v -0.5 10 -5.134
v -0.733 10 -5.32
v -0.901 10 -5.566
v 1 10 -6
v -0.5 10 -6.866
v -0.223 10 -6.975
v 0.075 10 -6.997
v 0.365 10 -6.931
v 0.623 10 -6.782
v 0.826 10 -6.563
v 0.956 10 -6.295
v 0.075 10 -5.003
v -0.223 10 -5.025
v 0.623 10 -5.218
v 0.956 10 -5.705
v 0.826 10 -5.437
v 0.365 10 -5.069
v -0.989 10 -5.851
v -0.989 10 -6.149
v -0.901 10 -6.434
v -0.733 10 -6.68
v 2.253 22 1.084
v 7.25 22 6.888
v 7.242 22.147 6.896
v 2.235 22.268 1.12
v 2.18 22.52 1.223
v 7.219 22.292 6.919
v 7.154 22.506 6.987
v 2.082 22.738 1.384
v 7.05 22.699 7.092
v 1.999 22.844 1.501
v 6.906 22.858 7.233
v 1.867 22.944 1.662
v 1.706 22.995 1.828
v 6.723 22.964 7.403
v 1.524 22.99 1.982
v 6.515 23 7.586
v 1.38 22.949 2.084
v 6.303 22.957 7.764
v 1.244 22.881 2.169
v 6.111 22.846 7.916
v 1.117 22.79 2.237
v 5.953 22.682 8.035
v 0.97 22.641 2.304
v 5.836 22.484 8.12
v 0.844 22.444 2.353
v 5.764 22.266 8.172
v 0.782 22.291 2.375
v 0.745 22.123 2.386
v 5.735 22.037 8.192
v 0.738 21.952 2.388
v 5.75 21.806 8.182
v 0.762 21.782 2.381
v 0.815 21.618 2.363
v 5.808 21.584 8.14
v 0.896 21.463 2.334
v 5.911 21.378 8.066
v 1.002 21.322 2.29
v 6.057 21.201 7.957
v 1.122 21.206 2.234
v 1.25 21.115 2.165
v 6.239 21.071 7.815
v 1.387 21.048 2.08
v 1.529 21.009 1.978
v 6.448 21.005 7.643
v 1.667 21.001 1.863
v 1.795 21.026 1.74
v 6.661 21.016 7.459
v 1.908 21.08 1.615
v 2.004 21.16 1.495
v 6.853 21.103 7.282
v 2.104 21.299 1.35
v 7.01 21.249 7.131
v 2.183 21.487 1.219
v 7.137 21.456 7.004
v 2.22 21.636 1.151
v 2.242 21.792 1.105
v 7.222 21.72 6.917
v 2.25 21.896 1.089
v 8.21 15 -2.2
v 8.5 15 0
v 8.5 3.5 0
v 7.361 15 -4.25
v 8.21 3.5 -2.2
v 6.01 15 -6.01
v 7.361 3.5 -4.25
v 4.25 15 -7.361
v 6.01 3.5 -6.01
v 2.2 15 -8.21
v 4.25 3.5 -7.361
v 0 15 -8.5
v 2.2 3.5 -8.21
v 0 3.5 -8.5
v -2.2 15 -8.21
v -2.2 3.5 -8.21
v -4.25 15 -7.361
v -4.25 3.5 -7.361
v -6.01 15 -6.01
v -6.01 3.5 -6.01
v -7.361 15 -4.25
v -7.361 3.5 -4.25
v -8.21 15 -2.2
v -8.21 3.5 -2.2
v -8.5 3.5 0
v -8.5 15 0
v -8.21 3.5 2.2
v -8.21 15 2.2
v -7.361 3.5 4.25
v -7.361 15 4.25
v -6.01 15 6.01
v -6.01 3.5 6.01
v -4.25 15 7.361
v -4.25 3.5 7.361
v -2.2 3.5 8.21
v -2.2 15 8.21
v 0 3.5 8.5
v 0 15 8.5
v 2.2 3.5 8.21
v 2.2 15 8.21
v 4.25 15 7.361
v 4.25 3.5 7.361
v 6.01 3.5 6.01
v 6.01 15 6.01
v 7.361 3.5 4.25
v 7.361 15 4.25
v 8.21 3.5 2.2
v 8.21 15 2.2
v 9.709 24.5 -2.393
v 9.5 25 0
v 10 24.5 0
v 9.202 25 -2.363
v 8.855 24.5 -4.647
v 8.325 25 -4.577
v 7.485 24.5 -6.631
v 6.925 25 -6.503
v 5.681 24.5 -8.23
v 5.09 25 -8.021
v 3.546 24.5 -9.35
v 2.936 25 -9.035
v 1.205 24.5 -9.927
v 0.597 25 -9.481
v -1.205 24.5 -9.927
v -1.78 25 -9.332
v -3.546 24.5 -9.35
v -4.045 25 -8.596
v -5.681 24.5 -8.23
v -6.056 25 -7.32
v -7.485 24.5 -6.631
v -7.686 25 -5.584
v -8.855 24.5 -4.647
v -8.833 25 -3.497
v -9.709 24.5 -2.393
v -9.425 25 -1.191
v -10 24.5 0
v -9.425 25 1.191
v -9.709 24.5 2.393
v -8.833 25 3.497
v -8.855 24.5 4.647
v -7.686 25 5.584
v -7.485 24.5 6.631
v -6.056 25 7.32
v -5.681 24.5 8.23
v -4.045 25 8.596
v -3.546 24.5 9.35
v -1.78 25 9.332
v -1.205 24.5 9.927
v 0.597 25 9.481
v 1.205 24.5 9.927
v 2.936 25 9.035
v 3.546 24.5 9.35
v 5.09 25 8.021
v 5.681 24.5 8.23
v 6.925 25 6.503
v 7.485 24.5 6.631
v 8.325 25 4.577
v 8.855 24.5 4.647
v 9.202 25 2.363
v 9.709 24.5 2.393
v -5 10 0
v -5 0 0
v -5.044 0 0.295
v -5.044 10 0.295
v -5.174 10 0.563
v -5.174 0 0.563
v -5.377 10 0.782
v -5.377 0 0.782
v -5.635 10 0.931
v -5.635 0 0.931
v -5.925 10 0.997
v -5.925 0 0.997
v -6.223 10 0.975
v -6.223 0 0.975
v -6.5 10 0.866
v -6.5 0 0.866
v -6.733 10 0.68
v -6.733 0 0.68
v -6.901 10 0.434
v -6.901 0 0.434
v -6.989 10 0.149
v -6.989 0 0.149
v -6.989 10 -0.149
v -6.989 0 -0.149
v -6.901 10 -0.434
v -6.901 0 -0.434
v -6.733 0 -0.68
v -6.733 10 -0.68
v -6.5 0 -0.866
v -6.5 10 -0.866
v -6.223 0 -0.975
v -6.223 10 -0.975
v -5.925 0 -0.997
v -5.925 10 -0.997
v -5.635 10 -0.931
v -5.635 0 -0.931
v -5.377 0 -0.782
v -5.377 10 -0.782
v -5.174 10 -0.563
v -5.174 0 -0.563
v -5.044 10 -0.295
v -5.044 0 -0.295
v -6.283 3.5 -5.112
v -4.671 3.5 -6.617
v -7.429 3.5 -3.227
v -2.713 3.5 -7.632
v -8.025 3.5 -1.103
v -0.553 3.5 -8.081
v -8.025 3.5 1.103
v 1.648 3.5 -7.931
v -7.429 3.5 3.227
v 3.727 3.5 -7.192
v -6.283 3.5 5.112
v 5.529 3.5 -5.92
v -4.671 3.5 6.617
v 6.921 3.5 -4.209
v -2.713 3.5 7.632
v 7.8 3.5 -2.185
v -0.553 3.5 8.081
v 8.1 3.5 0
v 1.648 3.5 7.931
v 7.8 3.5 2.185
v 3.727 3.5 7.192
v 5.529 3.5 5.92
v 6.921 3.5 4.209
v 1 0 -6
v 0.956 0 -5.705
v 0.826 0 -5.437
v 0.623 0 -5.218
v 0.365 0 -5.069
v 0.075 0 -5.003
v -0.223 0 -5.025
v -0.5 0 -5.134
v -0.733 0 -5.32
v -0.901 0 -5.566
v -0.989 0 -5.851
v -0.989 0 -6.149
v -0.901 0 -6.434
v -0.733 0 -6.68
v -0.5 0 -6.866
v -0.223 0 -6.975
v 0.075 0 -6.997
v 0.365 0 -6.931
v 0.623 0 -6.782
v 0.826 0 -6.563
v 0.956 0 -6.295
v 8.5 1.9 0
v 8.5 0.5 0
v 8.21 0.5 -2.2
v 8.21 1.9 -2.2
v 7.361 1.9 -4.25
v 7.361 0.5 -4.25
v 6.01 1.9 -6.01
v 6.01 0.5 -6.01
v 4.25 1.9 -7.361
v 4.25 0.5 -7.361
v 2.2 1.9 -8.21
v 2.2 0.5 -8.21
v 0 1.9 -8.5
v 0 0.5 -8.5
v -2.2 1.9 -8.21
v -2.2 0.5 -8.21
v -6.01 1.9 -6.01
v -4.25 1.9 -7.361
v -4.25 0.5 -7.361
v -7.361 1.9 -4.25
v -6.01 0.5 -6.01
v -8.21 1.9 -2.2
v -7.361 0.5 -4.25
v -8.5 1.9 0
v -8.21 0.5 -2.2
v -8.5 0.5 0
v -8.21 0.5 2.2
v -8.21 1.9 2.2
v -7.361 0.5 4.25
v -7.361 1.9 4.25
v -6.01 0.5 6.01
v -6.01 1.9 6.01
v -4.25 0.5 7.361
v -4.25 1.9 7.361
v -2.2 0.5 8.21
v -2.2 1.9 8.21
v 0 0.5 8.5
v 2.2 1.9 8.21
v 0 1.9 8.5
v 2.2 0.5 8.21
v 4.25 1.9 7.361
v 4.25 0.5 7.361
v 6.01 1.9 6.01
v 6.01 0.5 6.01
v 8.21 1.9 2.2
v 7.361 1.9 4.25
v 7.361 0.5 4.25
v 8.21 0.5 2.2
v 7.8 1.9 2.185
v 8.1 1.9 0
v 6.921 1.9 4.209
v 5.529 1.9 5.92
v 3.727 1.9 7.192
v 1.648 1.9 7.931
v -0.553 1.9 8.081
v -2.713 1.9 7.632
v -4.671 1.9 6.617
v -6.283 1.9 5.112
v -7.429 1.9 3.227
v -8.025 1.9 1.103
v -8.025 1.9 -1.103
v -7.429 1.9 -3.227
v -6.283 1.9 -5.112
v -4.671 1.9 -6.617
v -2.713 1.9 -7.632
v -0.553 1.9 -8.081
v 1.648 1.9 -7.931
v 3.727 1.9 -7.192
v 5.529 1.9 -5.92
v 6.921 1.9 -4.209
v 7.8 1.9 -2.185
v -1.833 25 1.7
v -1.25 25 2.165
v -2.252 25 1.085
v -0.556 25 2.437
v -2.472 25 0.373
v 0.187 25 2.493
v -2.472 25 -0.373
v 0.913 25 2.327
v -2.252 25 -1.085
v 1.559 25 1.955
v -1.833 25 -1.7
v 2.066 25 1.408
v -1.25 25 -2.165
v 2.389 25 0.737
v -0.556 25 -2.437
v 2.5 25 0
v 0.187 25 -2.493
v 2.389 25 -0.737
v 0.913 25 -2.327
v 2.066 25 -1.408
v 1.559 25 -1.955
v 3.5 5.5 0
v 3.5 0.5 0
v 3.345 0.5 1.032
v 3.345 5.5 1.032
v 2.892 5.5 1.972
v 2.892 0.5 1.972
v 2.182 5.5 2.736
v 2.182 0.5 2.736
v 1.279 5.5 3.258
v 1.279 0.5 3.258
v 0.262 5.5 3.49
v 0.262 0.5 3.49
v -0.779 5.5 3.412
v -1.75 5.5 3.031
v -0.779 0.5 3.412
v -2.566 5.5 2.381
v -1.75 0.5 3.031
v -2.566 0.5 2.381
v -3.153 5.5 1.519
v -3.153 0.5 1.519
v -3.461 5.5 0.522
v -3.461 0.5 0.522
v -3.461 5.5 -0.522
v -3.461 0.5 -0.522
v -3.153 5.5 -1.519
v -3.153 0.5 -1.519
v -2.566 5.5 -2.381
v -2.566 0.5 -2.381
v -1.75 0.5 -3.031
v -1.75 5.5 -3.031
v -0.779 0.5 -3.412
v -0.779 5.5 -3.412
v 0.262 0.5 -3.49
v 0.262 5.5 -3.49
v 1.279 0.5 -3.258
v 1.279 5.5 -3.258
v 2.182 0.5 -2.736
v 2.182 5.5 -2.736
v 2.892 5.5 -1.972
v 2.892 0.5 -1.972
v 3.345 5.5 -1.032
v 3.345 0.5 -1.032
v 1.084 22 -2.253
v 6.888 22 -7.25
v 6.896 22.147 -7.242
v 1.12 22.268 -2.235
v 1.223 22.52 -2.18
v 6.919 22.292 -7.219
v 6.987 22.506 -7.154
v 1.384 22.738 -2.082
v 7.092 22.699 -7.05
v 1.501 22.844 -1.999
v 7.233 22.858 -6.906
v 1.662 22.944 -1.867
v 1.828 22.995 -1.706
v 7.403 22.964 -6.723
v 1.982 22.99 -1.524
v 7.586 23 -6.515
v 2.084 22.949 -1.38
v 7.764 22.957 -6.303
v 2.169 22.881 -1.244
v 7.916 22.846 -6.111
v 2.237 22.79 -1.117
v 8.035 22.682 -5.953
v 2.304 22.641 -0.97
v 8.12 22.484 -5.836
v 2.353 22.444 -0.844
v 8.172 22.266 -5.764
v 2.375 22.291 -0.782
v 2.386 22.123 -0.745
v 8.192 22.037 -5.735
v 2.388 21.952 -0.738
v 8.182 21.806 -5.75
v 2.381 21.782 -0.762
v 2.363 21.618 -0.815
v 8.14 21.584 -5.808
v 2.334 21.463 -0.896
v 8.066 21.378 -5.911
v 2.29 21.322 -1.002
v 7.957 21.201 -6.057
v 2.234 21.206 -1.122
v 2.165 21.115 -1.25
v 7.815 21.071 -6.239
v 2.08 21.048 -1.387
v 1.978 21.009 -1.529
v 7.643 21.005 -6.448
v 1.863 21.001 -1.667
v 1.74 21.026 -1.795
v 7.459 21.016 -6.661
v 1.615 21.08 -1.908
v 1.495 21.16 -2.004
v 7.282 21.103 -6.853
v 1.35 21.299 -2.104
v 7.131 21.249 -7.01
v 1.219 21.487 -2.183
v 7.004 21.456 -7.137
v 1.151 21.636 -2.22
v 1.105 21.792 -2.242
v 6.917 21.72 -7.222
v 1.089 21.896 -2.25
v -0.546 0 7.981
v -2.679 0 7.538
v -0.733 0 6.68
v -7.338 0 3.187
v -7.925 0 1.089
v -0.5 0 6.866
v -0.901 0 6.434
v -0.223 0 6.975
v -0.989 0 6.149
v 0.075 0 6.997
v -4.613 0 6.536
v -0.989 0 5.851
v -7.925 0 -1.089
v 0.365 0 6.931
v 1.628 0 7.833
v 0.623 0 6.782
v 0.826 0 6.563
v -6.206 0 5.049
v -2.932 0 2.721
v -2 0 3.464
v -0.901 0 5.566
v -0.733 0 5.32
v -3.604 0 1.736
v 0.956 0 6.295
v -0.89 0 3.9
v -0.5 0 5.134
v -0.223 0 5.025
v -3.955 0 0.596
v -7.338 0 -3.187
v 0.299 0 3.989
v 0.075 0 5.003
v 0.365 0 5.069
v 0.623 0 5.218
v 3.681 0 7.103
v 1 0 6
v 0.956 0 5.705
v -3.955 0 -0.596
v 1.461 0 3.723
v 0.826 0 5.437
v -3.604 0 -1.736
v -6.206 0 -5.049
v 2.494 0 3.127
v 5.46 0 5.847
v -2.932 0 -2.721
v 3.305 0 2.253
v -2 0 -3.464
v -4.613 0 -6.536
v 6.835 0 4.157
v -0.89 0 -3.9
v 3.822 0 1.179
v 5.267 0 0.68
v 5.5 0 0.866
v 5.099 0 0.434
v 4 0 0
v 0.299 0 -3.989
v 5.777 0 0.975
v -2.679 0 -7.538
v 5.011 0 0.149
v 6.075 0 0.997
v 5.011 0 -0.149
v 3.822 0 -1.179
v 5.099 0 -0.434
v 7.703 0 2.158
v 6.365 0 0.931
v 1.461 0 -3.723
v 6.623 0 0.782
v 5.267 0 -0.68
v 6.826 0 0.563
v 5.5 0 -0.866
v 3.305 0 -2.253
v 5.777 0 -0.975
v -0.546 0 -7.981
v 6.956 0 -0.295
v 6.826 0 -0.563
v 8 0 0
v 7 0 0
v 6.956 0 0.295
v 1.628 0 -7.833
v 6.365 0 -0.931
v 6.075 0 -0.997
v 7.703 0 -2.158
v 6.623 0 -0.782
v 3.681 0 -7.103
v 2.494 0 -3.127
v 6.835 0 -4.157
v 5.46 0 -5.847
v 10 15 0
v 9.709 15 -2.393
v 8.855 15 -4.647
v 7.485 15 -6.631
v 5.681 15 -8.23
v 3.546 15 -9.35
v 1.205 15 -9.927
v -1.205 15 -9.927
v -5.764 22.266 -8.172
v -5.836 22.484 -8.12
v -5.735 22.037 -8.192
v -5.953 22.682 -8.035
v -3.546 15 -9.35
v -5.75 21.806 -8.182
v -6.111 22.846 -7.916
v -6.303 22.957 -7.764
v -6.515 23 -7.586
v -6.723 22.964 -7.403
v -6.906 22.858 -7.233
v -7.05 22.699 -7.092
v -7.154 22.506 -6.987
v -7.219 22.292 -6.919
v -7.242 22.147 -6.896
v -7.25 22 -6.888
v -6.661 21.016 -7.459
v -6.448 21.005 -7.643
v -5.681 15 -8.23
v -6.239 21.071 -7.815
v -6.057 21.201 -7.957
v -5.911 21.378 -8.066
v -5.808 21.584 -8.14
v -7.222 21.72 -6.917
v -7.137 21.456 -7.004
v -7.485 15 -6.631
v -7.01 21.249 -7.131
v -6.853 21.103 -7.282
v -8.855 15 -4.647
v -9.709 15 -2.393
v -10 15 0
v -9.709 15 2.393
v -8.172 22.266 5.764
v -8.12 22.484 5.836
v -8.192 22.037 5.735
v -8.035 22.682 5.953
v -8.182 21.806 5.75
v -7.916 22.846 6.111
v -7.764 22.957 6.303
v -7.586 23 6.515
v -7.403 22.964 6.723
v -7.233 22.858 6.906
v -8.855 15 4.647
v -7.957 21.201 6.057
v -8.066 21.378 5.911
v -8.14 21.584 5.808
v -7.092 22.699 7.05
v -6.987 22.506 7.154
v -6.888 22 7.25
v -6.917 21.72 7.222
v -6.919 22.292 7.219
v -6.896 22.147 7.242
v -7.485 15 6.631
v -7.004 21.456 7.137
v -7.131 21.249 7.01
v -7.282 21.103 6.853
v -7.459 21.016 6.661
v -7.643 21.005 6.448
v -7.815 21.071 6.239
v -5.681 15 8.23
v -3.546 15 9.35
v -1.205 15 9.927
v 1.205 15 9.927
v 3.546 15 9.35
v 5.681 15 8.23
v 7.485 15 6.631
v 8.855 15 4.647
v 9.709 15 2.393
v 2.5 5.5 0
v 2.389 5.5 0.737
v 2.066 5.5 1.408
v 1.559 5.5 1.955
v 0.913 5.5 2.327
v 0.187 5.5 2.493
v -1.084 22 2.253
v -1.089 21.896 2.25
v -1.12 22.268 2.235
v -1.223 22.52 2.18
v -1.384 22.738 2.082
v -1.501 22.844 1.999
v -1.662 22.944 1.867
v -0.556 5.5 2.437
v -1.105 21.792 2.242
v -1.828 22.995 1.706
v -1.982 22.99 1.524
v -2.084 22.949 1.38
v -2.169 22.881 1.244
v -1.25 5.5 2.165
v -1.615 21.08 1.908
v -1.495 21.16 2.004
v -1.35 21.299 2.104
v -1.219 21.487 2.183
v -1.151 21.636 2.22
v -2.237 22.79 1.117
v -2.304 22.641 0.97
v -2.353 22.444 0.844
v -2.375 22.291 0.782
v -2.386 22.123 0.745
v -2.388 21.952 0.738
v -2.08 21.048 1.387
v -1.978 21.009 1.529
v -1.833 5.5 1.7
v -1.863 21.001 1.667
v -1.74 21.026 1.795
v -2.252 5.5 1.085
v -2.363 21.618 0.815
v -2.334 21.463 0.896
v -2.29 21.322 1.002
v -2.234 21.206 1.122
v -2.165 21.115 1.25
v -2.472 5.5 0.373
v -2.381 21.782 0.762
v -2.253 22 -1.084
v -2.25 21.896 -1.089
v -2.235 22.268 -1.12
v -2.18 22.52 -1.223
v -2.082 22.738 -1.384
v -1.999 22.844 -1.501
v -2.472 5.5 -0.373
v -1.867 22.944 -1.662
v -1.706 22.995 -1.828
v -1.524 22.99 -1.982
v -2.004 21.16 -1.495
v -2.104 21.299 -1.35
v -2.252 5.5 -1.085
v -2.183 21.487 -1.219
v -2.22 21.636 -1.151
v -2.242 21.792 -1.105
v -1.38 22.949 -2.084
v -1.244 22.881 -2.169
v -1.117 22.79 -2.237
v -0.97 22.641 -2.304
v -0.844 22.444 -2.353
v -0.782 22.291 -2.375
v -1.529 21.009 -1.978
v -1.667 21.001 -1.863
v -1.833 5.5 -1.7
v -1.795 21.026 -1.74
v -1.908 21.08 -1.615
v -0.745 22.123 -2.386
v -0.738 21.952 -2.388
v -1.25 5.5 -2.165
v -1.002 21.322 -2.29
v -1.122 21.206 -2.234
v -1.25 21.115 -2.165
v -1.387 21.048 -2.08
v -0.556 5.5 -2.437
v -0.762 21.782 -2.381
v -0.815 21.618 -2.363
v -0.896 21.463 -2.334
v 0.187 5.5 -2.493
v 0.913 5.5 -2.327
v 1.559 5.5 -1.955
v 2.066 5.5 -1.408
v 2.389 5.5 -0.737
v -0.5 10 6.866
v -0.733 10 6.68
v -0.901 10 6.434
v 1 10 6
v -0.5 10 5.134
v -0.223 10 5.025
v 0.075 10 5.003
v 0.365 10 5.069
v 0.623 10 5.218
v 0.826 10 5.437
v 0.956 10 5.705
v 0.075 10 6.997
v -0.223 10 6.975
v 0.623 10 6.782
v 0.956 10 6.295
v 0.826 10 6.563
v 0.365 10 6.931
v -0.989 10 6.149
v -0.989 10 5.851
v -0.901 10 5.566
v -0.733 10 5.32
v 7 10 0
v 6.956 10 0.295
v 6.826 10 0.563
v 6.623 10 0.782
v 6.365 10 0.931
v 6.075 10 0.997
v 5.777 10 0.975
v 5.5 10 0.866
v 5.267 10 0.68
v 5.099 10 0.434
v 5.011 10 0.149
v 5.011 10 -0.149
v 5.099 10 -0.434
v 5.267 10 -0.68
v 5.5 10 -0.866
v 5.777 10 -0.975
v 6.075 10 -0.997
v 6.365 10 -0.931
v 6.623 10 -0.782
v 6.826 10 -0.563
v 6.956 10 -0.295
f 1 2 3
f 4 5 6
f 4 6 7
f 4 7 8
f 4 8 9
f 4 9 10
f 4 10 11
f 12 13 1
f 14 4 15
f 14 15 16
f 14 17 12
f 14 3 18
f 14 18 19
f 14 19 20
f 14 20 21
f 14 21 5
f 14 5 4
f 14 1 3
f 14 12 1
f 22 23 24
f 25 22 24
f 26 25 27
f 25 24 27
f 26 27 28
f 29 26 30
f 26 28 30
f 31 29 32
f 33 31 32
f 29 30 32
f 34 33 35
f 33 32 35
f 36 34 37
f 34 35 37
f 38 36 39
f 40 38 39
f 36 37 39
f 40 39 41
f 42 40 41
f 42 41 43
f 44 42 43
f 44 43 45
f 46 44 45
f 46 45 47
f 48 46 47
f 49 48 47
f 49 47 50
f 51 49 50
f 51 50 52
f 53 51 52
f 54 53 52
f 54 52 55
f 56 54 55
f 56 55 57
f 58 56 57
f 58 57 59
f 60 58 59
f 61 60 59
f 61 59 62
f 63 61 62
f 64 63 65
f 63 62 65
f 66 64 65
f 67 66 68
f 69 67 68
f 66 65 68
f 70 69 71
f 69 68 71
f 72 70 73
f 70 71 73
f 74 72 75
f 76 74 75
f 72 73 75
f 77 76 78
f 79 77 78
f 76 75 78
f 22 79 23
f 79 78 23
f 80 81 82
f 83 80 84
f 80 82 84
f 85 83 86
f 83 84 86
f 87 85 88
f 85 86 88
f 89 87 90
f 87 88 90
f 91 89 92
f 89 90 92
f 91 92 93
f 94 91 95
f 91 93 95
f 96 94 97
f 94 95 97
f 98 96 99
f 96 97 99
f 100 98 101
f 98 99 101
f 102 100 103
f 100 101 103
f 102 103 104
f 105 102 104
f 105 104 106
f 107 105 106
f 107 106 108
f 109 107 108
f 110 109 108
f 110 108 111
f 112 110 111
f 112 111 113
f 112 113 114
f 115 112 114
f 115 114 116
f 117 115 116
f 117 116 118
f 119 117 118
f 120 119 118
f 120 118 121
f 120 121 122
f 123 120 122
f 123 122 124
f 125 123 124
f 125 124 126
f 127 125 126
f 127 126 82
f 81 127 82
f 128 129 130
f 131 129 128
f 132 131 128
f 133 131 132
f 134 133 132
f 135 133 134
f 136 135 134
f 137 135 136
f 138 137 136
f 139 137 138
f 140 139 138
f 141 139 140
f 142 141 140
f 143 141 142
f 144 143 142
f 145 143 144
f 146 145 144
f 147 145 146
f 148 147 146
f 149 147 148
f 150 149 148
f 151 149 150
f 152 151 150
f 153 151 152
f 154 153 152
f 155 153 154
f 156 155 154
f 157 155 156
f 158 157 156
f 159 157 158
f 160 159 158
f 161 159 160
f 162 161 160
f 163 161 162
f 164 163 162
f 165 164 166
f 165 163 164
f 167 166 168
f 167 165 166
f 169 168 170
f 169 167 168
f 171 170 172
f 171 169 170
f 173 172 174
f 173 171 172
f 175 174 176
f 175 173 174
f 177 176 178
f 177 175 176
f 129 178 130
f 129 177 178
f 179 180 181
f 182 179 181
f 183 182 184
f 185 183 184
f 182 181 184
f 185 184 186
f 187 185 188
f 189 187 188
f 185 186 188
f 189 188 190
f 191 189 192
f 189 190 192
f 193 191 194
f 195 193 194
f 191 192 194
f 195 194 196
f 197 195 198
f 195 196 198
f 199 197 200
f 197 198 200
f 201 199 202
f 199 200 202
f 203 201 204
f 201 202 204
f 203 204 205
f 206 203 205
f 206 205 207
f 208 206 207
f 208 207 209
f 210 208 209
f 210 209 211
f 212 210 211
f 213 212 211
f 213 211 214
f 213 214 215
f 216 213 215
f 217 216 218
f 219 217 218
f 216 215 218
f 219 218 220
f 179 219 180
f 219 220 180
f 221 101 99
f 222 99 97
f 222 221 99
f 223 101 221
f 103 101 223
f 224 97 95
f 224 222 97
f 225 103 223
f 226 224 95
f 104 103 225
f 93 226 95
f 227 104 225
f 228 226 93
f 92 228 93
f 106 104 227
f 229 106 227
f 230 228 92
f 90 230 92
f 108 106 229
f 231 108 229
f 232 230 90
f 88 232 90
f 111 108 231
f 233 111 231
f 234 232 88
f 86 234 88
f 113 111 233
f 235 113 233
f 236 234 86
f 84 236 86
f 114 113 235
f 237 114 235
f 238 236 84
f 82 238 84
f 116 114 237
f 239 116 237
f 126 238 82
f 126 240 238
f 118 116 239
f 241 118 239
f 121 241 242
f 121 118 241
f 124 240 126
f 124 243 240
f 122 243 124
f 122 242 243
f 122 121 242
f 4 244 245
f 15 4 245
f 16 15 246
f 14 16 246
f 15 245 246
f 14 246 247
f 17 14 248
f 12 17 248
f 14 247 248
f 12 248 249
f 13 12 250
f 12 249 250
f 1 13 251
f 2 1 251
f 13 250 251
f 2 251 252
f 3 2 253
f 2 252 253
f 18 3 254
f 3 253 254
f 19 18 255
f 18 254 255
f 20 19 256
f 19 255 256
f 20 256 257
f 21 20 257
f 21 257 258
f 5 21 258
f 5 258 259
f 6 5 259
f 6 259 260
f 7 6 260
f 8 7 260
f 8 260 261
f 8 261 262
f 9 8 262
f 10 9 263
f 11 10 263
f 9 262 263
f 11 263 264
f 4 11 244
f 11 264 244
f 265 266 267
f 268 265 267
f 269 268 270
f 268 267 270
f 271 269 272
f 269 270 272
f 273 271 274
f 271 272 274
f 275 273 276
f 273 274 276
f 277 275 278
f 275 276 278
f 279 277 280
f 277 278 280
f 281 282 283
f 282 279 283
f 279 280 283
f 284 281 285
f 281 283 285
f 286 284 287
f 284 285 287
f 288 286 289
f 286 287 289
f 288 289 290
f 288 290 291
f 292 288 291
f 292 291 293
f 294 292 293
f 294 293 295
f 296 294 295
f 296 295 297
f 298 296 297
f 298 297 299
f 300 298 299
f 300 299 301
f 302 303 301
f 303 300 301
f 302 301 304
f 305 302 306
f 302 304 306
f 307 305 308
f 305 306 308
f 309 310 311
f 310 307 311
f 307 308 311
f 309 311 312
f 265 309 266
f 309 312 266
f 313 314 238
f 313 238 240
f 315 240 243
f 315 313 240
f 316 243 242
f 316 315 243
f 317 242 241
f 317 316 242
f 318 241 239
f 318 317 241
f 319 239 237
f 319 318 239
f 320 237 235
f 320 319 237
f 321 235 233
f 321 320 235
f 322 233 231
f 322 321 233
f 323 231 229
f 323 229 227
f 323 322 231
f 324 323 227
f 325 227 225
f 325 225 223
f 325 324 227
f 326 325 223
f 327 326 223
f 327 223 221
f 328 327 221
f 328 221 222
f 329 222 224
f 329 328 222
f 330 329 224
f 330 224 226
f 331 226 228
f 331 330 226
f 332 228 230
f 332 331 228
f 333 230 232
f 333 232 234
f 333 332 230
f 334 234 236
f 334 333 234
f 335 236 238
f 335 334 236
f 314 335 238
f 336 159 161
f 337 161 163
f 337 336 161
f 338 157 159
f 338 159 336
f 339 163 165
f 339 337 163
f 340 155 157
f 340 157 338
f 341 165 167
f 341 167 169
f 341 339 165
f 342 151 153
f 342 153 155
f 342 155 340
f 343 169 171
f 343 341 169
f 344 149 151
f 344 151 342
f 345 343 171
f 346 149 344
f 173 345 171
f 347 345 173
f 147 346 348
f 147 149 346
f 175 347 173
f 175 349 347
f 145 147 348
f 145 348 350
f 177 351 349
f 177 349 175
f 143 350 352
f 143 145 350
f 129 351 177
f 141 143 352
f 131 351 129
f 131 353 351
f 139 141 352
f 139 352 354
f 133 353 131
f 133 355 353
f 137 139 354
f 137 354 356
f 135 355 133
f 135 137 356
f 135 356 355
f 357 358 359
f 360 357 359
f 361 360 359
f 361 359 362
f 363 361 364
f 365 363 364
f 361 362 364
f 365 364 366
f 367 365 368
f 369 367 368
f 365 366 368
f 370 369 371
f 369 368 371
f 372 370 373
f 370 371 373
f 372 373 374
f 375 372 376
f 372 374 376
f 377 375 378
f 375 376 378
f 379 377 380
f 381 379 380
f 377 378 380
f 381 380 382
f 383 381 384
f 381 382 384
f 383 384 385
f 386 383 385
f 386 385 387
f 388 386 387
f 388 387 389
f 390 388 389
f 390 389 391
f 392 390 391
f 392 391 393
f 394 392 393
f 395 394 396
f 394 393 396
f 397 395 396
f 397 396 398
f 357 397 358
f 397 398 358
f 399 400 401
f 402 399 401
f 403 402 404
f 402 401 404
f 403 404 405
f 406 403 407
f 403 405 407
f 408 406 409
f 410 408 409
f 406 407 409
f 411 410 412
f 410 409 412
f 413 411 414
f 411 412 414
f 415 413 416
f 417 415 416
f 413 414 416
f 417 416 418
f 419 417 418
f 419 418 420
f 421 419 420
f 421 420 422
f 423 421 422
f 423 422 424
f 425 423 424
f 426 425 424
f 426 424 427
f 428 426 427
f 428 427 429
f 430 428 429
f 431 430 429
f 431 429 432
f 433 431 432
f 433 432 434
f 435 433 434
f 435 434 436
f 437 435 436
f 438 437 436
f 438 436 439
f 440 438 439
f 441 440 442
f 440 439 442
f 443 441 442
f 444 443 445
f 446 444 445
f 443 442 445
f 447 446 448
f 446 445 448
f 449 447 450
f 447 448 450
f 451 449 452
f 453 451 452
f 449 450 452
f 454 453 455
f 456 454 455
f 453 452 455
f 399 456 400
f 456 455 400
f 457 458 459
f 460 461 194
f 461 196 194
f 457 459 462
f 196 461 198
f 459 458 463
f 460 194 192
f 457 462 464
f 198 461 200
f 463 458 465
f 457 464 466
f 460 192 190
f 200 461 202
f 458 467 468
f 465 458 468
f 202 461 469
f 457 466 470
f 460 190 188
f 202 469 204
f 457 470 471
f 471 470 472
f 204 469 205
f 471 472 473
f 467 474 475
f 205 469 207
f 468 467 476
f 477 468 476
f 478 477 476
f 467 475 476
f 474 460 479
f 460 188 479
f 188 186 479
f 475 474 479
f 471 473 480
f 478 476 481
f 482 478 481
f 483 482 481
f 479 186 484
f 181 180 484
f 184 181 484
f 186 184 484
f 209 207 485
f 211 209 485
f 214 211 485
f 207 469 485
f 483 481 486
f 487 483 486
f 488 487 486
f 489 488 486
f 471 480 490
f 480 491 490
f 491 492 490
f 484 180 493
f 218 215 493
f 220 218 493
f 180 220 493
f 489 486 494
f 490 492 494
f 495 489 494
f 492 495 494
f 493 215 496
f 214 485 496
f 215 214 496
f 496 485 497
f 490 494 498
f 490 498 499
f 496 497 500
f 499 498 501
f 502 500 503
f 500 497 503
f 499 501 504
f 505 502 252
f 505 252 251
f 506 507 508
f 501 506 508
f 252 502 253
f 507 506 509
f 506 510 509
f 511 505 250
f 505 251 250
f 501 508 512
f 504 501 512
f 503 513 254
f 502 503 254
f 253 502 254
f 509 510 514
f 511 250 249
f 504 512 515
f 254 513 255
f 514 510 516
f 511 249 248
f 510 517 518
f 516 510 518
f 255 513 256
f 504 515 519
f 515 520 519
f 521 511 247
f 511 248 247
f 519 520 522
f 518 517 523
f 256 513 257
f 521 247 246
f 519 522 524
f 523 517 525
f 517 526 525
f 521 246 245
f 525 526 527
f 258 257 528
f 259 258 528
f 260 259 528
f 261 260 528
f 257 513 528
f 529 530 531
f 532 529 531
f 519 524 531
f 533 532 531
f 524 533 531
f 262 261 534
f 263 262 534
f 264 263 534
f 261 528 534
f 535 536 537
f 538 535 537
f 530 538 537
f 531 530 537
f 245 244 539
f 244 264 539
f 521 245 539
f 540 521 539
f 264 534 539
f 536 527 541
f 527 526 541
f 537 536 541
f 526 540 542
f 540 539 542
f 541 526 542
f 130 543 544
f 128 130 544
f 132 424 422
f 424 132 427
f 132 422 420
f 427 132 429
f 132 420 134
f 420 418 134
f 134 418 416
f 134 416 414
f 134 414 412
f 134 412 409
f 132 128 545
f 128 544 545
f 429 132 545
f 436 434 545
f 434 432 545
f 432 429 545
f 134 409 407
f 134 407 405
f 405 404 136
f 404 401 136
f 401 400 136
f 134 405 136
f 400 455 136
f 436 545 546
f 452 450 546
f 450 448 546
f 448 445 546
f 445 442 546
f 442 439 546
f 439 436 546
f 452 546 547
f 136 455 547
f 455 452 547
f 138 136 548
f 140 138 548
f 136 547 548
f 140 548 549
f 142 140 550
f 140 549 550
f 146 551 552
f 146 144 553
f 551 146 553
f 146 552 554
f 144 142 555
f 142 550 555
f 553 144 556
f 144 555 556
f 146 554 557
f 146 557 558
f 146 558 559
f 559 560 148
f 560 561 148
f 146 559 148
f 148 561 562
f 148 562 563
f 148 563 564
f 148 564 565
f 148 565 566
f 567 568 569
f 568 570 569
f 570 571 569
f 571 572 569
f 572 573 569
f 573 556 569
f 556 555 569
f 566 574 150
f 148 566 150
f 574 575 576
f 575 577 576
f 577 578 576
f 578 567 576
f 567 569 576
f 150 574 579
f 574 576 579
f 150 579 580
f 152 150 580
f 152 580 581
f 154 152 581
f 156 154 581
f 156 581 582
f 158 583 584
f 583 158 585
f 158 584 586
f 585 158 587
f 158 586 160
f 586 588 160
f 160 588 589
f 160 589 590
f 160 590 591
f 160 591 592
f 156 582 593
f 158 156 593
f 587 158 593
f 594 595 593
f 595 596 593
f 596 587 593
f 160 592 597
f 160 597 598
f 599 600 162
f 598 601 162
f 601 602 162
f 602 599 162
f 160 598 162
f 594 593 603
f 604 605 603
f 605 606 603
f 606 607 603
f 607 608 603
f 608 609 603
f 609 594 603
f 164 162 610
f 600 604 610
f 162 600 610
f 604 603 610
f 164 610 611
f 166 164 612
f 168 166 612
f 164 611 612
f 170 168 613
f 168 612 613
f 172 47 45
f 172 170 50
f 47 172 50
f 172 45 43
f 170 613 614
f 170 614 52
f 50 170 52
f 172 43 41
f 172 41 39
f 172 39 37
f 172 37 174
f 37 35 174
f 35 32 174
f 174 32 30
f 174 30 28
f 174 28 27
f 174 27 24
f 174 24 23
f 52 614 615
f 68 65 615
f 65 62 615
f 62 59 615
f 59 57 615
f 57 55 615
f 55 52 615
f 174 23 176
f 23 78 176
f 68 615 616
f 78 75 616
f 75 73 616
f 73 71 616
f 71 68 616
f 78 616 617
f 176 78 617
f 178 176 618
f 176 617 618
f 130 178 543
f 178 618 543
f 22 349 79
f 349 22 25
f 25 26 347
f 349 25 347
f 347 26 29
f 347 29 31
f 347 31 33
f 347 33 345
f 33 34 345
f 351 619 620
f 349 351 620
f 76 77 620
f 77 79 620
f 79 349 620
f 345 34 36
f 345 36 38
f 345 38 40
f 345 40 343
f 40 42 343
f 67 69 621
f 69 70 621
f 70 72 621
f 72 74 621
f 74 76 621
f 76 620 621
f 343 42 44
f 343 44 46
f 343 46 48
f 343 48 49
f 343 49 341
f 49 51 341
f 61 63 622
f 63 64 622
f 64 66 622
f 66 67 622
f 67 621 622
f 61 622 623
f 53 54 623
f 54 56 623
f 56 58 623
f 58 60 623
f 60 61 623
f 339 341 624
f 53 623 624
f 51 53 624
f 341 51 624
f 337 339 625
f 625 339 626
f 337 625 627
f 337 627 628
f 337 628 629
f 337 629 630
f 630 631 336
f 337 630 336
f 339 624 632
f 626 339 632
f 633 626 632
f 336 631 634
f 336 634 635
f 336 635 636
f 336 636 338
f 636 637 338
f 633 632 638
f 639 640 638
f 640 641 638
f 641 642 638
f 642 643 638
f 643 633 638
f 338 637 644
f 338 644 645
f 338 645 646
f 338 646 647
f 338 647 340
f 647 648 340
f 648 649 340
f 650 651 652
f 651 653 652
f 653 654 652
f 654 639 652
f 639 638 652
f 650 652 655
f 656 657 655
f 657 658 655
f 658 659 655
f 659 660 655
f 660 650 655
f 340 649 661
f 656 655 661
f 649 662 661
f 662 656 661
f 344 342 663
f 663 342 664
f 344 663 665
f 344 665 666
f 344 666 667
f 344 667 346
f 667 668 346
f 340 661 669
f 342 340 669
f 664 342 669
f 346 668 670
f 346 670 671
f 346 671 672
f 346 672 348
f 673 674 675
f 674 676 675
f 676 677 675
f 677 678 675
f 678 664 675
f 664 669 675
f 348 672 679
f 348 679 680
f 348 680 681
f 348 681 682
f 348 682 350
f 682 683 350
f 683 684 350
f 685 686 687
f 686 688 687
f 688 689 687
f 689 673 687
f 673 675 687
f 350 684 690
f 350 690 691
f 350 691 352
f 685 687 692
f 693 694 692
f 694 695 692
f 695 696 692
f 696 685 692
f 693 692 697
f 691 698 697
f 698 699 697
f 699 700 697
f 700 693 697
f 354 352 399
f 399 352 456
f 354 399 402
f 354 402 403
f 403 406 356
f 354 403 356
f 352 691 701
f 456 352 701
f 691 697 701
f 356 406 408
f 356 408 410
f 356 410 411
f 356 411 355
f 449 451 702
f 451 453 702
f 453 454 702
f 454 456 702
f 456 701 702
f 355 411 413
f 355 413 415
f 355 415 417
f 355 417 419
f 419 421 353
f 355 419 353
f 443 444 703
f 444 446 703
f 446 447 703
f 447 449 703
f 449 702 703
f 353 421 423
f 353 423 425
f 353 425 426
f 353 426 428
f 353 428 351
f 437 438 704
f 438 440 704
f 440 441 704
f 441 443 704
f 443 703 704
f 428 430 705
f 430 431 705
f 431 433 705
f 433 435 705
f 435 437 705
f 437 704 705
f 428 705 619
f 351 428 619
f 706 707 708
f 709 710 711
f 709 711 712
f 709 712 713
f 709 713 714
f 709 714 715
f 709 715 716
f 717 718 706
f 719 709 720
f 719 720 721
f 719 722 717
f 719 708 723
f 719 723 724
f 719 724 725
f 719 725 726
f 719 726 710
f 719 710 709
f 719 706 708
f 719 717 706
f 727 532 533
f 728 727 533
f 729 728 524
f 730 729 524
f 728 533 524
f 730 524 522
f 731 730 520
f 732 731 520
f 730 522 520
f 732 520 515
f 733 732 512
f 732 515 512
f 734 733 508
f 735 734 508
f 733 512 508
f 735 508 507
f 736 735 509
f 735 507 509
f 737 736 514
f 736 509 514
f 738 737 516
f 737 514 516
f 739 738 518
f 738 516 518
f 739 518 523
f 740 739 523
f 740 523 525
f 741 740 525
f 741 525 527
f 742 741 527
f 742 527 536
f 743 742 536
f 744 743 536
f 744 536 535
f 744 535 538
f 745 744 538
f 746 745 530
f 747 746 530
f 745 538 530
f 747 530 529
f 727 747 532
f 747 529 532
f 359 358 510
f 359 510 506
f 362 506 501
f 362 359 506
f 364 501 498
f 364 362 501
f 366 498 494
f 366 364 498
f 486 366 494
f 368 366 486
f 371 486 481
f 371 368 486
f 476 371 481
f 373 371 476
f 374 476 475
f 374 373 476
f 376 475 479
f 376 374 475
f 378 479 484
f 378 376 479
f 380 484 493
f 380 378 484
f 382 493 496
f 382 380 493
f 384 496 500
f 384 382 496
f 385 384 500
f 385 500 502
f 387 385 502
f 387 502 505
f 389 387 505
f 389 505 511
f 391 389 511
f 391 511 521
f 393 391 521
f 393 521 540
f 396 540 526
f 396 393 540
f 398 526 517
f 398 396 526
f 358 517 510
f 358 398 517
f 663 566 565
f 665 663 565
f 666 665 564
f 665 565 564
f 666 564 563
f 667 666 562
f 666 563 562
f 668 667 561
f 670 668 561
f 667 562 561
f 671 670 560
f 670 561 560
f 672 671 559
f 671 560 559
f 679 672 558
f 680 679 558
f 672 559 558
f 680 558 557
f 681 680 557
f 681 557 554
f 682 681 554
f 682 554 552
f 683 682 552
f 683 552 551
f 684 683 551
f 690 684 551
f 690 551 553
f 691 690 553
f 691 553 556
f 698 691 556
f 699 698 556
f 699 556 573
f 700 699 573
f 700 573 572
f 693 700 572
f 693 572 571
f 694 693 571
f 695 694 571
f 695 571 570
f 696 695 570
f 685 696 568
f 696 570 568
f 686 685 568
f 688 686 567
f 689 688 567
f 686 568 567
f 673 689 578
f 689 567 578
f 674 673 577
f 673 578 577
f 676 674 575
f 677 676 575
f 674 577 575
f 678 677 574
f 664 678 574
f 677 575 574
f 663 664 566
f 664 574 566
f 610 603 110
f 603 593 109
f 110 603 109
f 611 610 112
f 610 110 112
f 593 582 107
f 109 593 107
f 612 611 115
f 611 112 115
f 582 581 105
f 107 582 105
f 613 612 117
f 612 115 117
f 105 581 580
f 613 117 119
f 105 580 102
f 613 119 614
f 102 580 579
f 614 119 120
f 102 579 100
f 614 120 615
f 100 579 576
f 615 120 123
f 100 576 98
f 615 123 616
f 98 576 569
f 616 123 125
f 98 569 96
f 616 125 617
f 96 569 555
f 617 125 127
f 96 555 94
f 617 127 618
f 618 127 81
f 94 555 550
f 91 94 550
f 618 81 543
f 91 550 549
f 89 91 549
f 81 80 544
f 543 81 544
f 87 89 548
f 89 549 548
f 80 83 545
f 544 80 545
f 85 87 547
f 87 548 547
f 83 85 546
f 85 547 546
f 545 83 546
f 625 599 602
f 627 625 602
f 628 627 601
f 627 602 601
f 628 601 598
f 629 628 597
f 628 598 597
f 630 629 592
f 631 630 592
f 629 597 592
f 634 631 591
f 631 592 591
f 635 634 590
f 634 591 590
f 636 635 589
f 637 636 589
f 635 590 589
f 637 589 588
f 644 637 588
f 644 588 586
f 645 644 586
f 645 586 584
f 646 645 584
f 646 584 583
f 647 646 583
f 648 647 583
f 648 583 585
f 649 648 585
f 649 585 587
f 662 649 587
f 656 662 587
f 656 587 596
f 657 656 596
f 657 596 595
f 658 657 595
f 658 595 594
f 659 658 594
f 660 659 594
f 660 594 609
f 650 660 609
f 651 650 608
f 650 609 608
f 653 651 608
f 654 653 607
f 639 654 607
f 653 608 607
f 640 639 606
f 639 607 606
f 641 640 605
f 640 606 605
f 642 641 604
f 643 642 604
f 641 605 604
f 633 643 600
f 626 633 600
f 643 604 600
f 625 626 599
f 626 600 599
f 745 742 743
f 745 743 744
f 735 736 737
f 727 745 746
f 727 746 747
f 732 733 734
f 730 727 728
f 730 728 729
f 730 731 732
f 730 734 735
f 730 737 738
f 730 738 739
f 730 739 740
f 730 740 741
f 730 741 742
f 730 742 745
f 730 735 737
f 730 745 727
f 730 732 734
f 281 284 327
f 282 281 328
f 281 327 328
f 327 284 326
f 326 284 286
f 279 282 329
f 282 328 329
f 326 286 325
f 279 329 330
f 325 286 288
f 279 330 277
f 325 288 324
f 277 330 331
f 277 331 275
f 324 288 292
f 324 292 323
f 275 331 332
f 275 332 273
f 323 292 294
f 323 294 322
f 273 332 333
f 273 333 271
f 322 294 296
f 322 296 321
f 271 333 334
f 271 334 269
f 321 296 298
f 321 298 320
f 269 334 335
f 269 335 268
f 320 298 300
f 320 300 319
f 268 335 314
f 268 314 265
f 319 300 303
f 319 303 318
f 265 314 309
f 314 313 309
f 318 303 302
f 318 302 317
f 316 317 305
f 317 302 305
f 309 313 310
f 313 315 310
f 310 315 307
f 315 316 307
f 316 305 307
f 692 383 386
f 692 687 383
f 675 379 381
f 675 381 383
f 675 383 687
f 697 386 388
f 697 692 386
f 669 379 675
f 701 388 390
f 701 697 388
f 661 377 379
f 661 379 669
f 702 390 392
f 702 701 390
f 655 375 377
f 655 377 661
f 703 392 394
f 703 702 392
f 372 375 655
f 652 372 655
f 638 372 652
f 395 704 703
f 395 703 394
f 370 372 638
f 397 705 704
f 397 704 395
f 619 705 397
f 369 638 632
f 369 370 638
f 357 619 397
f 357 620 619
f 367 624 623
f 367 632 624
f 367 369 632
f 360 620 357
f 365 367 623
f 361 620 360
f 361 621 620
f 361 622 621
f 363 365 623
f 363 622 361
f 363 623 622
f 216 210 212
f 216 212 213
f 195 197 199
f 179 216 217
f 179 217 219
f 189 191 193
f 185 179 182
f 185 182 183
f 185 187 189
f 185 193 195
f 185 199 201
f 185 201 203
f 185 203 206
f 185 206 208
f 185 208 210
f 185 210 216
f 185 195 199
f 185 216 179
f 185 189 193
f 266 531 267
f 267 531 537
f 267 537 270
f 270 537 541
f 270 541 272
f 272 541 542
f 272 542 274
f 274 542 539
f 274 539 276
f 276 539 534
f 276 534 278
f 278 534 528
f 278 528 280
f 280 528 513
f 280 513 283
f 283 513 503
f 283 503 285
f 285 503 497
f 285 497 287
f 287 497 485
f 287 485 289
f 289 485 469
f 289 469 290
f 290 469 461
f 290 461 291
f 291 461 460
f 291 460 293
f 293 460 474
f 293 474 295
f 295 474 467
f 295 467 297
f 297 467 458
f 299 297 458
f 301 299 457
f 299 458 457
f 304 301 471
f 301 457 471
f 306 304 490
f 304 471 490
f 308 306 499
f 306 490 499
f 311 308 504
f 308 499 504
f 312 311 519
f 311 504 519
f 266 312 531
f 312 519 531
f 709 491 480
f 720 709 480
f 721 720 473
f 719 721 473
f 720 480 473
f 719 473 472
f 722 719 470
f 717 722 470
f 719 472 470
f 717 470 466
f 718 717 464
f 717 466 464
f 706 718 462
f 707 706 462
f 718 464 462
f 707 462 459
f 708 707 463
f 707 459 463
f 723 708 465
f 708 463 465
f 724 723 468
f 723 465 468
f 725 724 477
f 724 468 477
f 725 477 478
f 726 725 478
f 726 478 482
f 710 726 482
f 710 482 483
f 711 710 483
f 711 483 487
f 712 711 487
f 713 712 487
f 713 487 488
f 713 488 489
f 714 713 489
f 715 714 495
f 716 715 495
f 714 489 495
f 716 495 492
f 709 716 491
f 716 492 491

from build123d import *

# Parameters (mm, degrees)
SKETCH_1_R               = 8.5
EXTRUDE_1_DEPTH          = 15
SKETCH_2_R               = 10
EXTRUDE_2_DEPTH          = 10
SKETCH_3_R               = 1
CUT_EXTRUDE_1_DEPTH      = 10
CUT_EXTRUDE_START        = -1.9
SKETCH_4_R               = 8.5
SKETCH_4_R_2             = 8.1
CUT_EXTRUDE_2_DEPTH      = 1.6
CHAMFER_1_SIZE           = 0.5
SKETCH_7_R               = 1
CUT_EXTRUDE_3_DEPTH      = 8
PATTERN_CIRCULAR_1_COUNT = 4
SKETCH_8_R               = 3.5
CUT_EXTRUDE_4_DEPTH      = 5.5
CHAMFER_2_SIZE           = 0.5
CUT_EXTRUDE_5_REACH      = 21.5
SKETCH_9_R               = 2.5


with BuildPart() as part:
    # Эскиз1 → Бобышка-Вытянуть1 (new body)
    with BuildSketch(Plane(origin=(0, 0, 0), x_dir=(1, 0, 0), z_dir=(0, 1, 0))):
        Circle(SKETCH_1_R)
    extrude(amount=EXTRUDE_1_DEPTH)

    # Эскиз2 → Бобышка-Вытянуть2 (add)
    with BuildSketch(Plane(origin=(0, 15, 0), x_dir=(1, 0, 0), z_dir=(0, 1, 0))):
        Circle(SKETCH_2_R)
    extrude(amount=EXTRUDE_2_DEPTH)

    # Эскиз3 → Вырез-Вытянуть1 (cut)
    with BuildSketch(Plane.XZ):
        with Locations((0, 6)):
            Circle(SKETCH_3_R)
        with Locations((6, 0)):
            Circle(SKETCH_3_R)
        with Locations((0, -6)):
            Circle(SKETCH_3_R)
        with Locations((-6, 0)):
            Circle(SKETCH_3_R)
    extrude(amount=-CUT_EXTRUDE_1_DEPTH, mode=Mode.SUBTRACT)

    # Эскиз4 → Вырез-Вытянуть2 (cut)
    with BuildSketch(Plane.XZ.offset(CUT_EXTRUDE_START)):
        Circle(SKETCH_4_R)
        Circle(SKETCH_4_R_2, mode=Mode.SUBTRACT)
    extrude(amount=-CUT_EXTRUDE_2_DEPTH, mode=Mode.SUBTRACT)

    # Фаска1
    chamfer_1_edges = [part.edges().sort_by_distance(p)[0] for p in [
        (-8.5, 0, 0),
        (-10, 25, 0),
    ]]
    chamfer(chamfer_1_edges, length=CHAMFER_1_SIZE)

    # Эскиз7 → Вырез-Вытянуть3 (cut)
    with BuildSketch(Plane(origin=(6.524591557, 0, 7.578238913), x_dir=(0.757823891, 0, -0.652459156), z_dir=(0.652459156, 0, 0.757823891))):
        with Locations((0, 22)):
            Circle(SKETCH_7_R)
    cut_extrude_3 = extrude(amount=-CUT_EXTRUDE_3_DEPTH, mode=Mode.SUBTRACT)

    # Круговой массив1: Вырез-Вытянуть3 ×4 about axis
    pattern_circular_1_axis = Axis((0, 0, 0), (0, 1, 0))
    for i in range(1, PATTERN_CIRCULAR_1_COUNT):
        add(cut_extrude_3.rotate(pattern_circular_1_axis, i * 360 / PATTERN_CIRCULAR_1_COUNT), mode=Mode.SUBTRACT)

    # Эскиз8 → Вырез-Вытянуть4 (cut)
    with BuildSketch(Plane.XZ):
        Circle(SKETCH_8_R)
    extrude(amount=-CUT_EXTRUDE_4_DEPTH, mode=Mode.SUBTRACT)

    # Фаска2
    chamfer_2_edges = [part.edges().sort_by_distance(p)[0] for p in [
        (-3.5, 0, 0),
    ]]
    chamfer(chamfer_2_edges, length=CHAMFER_2_SIZE)

    # Эскиз9 → Вырез-Вытянуть5 (cut, up to next)
    with BuildSketch(Plane.XZ.offset(-5.5), mode=Mode.PRIVATE) as cut_extrude_5_sk1:
        Circle(SKETCH_9_R)
    cut_extrude_5_tool1 = extrude(cut_extrude_5_sk1.sketch, amount=-CUT_EXTRUDE_5_REACH, mode=Mode.PRIVATE) & part.part
    add(cut_extrude_5_tool1.solids().sort_by_distance((0, 5.5, 0))[0], mode=Mode.SUBTRACT)


solid = part.part
